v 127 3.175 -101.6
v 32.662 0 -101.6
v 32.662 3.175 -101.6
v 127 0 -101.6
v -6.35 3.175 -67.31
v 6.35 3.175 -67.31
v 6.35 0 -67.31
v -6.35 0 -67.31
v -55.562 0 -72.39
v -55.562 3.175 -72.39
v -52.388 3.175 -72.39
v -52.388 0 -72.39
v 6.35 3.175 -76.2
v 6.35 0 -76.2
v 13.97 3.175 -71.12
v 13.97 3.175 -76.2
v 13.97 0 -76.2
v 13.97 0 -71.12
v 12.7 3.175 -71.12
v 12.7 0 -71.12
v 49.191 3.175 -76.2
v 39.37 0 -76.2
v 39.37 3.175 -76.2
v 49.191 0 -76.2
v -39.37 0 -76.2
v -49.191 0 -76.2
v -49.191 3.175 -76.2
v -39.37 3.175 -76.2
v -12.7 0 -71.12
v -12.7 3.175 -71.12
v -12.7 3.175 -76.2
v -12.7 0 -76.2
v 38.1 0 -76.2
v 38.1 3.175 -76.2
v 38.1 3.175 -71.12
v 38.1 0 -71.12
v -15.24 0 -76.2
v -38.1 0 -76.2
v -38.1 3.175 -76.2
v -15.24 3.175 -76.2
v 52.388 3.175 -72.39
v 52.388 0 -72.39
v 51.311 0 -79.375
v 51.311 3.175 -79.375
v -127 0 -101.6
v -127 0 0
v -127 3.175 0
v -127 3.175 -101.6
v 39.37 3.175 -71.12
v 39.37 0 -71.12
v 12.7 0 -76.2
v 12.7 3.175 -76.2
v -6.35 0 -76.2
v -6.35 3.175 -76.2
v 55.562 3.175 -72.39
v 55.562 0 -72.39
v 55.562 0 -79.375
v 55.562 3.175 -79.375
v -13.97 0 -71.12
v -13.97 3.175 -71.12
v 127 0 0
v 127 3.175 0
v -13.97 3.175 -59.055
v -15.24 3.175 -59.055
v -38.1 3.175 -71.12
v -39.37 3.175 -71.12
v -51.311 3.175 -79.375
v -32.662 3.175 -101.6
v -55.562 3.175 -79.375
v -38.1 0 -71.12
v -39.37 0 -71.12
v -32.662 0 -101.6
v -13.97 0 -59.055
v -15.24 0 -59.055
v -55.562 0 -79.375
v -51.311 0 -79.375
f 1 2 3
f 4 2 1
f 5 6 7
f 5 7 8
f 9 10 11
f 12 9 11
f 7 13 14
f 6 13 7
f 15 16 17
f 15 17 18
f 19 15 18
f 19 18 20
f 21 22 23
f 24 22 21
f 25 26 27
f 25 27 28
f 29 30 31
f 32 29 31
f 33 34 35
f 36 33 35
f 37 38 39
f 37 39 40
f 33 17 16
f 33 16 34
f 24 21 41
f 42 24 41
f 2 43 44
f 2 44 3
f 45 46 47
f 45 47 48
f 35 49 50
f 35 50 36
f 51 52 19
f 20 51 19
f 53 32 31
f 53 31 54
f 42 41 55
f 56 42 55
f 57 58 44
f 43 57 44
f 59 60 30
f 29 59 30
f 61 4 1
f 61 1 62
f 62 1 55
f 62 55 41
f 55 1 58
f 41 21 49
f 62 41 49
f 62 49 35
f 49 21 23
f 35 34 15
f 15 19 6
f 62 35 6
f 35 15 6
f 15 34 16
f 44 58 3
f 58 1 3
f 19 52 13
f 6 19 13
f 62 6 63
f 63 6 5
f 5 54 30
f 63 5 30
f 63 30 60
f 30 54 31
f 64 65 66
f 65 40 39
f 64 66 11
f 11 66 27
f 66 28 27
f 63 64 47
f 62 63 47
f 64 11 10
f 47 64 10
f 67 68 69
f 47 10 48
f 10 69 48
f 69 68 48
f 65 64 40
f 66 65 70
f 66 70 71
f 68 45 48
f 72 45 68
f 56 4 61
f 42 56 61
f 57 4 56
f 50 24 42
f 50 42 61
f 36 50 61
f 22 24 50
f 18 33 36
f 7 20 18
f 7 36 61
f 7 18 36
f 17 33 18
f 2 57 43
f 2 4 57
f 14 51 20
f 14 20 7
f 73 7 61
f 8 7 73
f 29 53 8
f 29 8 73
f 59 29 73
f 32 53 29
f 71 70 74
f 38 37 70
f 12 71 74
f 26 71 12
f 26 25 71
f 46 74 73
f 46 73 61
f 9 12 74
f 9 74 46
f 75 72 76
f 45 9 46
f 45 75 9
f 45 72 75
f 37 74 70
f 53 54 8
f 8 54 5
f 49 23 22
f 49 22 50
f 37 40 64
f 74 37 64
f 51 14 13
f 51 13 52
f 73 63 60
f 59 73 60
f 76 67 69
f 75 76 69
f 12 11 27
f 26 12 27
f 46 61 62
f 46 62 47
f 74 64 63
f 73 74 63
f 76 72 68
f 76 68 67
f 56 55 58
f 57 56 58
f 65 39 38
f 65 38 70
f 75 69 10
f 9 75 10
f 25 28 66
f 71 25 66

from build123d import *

# Parameters (mm, degrees)
BOSS_EXTRUDE1_DEPTH = 3.175
SKETCH2_W           = 1.27
SKETCH2_H           = 5.08
SKETCH2_W_2         = 12.7
SKETCH2_H_2         = 8.89
CUT_EXTRUDE1_DEPTH  = 3.175


with BuildPart() as part:
    # Sketch1 → Boss-Extrude1 (new body)
    with BuildSketch(Plane(origin=(0, 0, 0), x_dir=(1, 0, 0), z_dir=(0, 1, 0))):
        Polygon((32.661869368, 101.6), (127, 101.6), (127, 0), (-127, 0), (-127, 101.6), (-32.661869368, 101.6), (-53.975, 76.2), (53.975, 76.2), align=None)
    extrude(amount=BOSS_EXTRUDE1_DEPTH)

    # Sketch2 → Cut-Extrude1 (cut)
    with BuildSketch(Plane(origin=(0, 3.175, 0), x_dir=(-1, 0, 0), z_dir=(0, 1, 0))):
        with Locations((38.735, -73.66)):
            Rectangle(SKETCH2_W, SKETCH2_H)
        Polygon((52.3875, -72.39), (49.190530405, -76.2), (53.975, -76.2), (51.310858671, -79.375), (55.5625, -79.375), (55.5625, -72.39), align=None)
        Polygon((12.7, -76.2), (15.24, -76.2), (15.24, -59.055), (13.97, -59.055), (13.97, -71.12), (12.7, -71.12), align=None)
        with Locations((0, -71.755)):
            Rectangle(SKETCH2_W_2, SKETCH2_H_2)
        with Locations((-13.335, -73.66)):
            Rectangle(SKETCH2_W, SKETCH2_H)
        with Locations((-38.735, -73.66)):
            Rectangle(SKETCH2_W, SKETCH2_H)
        Polygon((-53.975, -76.2), (-49.190530405, -76.2), (-52.3875, -72.39), (-55.5625, -72.39), (-55.5625, -79.375), (-51.310858671, -79.375), align=None)
    extrude(amount=-CUT_EXTRUDE1_DEPTH, mode=Mode.SUBTRACT)


solid = part.part
